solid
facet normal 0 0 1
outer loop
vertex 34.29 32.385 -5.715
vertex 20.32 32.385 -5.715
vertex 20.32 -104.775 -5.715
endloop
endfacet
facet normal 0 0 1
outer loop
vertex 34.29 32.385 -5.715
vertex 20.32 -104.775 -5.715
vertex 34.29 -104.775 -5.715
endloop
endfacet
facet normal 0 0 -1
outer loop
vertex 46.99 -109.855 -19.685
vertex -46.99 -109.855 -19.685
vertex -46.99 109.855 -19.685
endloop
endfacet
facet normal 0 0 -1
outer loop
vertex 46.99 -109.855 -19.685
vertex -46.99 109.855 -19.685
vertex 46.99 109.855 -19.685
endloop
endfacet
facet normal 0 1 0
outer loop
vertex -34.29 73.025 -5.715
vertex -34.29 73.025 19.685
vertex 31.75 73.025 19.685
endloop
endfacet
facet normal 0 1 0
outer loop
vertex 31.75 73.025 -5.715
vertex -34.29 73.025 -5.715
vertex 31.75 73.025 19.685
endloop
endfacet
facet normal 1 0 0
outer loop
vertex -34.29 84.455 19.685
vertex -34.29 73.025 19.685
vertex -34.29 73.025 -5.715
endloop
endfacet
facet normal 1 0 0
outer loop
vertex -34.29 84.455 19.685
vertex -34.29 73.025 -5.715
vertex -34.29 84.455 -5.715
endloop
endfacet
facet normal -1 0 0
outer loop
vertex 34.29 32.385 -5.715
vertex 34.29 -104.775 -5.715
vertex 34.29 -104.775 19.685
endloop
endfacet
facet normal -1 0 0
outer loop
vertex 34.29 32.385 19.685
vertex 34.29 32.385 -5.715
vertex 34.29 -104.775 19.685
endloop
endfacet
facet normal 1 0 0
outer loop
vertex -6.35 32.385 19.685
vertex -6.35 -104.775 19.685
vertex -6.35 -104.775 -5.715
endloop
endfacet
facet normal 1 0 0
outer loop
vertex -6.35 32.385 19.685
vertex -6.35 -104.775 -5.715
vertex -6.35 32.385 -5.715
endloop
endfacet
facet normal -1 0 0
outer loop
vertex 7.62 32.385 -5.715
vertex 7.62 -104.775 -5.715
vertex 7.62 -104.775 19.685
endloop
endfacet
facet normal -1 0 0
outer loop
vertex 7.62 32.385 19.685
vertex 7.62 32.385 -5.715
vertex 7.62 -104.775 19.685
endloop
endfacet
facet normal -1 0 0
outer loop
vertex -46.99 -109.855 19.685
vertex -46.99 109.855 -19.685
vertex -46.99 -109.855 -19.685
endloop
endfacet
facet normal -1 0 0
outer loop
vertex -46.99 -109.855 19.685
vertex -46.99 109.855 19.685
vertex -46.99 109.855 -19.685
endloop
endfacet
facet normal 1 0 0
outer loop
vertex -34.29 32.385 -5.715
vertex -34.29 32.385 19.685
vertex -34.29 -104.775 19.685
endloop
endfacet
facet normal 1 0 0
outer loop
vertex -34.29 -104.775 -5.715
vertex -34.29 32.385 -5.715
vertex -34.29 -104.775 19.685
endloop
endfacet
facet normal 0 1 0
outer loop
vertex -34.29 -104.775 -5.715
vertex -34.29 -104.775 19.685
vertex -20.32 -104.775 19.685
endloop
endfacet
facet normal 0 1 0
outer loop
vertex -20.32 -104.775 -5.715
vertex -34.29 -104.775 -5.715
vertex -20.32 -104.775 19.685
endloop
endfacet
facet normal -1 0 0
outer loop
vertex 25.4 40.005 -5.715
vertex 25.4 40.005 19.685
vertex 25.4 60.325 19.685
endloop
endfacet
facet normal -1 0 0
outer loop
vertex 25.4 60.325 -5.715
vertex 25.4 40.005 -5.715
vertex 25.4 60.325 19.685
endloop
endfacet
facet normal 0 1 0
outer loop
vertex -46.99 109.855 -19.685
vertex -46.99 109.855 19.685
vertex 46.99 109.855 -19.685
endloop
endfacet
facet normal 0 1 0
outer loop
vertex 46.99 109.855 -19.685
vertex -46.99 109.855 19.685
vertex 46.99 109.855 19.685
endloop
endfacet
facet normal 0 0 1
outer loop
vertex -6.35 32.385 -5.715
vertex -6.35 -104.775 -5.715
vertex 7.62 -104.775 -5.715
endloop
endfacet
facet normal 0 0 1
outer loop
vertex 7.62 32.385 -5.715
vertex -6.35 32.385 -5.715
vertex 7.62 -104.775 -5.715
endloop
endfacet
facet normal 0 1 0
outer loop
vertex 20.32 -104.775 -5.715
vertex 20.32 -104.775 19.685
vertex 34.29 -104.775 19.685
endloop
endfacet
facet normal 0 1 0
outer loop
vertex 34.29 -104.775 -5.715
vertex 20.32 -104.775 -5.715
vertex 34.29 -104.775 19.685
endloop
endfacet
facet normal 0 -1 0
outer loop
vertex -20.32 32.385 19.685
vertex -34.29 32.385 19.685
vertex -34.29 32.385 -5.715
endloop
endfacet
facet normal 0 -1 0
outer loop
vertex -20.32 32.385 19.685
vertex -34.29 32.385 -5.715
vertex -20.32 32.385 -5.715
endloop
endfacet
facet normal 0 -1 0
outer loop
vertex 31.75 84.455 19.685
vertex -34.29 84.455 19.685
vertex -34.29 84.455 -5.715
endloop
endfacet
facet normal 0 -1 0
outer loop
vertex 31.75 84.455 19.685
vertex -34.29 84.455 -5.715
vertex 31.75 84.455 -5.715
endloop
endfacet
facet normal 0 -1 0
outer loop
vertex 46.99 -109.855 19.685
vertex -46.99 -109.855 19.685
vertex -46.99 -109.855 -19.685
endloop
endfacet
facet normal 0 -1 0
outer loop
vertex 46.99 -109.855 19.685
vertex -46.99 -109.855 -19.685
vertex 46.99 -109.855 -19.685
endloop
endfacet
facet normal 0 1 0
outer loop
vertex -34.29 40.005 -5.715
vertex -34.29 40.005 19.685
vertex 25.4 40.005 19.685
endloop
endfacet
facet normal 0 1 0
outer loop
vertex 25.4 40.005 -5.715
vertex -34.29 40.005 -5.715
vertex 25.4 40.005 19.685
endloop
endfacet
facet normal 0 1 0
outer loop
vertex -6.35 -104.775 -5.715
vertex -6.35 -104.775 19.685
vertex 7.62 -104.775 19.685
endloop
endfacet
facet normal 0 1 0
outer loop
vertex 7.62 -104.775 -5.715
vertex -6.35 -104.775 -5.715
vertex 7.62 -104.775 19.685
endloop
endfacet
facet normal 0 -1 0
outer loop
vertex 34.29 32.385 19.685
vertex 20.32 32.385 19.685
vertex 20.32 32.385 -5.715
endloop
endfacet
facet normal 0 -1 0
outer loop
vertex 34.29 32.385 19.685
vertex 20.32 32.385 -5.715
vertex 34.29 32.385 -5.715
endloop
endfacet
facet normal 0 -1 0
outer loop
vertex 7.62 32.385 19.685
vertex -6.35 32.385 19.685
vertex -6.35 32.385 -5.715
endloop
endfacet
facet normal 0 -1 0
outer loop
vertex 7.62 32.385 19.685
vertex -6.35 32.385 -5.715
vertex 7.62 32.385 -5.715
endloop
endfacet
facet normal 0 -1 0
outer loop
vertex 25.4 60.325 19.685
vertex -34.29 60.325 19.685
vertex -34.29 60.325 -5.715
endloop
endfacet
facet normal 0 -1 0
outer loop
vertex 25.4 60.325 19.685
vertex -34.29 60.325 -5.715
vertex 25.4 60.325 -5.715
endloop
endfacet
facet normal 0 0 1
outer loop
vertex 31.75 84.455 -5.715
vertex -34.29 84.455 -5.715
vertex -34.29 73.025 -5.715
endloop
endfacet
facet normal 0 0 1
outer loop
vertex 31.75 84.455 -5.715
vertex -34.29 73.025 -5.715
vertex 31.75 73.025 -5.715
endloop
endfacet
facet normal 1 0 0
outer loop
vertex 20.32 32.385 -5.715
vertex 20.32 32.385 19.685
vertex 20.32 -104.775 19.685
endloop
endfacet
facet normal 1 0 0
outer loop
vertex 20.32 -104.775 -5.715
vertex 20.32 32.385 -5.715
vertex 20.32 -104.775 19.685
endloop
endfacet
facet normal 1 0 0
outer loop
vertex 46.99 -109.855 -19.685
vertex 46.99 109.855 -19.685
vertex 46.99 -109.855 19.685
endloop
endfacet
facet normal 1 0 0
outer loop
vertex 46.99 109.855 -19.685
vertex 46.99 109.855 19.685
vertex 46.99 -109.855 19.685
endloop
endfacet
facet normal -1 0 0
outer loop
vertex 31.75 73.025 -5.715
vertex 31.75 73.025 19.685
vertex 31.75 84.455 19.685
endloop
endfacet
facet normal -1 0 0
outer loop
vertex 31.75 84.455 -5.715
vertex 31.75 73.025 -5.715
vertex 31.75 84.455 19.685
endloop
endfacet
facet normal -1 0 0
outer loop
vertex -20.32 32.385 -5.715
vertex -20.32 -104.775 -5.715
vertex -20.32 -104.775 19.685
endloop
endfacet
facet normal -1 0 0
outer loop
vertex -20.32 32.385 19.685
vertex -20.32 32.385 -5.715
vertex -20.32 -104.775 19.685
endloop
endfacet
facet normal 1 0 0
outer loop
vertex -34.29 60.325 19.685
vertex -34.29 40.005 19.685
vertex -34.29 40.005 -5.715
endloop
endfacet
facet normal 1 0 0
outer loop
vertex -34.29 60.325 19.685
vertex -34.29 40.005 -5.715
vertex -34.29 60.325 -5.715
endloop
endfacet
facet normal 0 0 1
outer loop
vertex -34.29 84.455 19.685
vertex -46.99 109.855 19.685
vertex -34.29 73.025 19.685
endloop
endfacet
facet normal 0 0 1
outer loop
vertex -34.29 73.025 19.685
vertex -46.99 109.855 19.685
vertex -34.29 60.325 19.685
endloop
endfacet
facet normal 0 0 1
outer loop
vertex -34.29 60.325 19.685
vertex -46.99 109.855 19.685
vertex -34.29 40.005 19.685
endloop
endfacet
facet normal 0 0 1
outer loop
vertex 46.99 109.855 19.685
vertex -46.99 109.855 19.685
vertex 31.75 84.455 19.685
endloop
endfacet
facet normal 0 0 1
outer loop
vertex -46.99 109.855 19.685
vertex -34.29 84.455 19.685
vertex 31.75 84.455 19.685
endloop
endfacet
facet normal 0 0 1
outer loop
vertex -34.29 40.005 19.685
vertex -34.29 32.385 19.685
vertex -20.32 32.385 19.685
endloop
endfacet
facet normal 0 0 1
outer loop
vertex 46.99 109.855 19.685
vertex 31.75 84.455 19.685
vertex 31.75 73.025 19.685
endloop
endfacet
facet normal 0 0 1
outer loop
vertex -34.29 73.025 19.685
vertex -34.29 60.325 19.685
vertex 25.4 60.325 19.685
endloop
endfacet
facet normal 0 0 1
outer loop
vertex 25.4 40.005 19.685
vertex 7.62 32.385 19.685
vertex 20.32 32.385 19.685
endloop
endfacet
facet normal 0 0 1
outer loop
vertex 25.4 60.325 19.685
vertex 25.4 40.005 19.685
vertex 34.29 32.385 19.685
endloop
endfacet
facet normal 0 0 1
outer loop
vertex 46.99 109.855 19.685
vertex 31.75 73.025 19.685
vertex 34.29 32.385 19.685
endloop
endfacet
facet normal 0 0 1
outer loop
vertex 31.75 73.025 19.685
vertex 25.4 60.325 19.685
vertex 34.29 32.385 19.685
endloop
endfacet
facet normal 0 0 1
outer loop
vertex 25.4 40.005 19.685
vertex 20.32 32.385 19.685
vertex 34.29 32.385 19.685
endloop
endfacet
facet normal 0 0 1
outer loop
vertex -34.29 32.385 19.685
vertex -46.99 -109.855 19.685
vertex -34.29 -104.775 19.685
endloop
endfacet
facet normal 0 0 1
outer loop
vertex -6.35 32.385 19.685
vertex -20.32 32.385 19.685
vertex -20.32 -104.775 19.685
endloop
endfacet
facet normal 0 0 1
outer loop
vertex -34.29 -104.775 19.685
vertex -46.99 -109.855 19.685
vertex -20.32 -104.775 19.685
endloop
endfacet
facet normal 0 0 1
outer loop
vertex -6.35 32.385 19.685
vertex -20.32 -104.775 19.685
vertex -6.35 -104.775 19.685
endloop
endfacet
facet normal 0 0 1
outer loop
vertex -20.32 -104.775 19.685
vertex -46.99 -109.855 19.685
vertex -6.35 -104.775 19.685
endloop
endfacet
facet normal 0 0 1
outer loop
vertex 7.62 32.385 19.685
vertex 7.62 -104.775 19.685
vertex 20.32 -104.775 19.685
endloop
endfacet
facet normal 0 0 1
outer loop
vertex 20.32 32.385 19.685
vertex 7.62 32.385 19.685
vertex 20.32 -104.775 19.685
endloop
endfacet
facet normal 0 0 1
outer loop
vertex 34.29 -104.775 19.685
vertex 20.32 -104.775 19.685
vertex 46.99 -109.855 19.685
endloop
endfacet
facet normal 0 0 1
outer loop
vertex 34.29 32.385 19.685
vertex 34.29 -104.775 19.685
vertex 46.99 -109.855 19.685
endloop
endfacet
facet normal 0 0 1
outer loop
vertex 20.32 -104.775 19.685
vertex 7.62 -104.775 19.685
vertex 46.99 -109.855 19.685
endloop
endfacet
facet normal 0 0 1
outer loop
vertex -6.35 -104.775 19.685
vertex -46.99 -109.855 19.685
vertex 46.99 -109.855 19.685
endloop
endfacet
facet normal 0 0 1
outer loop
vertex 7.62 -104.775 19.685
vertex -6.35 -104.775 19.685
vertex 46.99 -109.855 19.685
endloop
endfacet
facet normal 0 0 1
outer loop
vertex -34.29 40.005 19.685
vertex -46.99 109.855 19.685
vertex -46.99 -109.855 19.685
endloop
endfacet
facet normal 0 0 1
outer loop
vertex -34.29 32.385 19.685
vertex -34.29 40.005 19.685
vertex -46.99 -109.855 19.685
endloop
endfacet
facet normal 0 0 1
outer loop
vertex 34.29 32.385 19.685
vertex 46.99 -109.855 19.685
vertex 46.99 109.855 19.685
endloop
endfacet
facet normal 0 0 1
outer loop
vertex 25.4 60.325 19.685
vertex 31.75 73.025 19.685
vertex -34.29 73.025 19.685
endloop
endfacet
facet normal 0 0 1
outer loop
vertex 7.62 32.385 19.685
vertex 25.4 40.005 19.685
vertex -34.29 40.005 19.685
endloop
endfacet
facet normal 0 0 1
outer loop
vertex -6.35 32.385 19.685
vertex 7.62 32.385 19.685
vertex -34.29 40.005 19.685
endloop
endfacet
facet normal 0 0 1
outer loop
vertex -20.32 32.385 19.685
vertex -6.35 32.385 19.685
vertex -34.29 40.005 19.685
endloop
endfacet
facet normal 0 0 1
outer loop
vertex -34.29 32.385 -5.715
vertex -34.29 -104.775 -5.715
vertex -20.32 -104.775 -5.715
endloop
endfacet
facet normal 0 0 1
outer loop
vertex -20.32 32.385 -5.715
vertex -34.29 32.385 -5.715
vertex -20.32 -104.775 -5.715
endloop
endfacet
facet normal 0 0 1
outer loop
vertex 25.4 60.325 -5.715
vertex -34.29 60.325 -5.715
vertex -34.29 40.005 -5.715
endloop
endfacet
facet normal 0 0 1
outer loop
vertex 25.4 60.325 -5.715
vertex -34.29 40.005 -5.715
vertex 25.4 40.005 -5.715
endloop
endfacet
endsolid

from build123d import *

# Parameters (mm, degrees)
F0_W      = 93.98
F0_H      = 219.71
F1_DEPTH  = 19.685
F1_FACE_W = 93.98
F1_FACE_H = 219.71
F2_DEPTH  = 19.685
F3_W      = 13.97
F3_H      = 137.16
F3_W_2    = 59.69
F3_H_2    = 20.32
F3_W_3    = 66.04
F3_H_3    = 11.43
F4_DEPTH  = 25.4
F5_DEPTH  = 6.35
F6_W      = 13.97
F6_H      = 137.16
F7_DEPTH  = 7.62
F8_DEPTH  = 12.7
F9_W      = 13.97
F9_H      = 25.4
F10_DEPTH = 5.08
F8_FACE_W = 13.97
F8_FACE_H = 25.4
F11_DEPTH = 5.08


with BuildPart() as f1:
    # F0 (on Top) → F1 (new body)
    with BuildSketch(Plane.XY):
        Rectangle(F0_W, F0_H)
    extrude(amount=F1_DEPTH)

    # F1_face (on face) → F2 (join)
    with BuildSketch(Plane(origin=(0, 0, 0), x_dir=(1, 0, 0), z_dir=(0, 0, -1))):
        Rectangle(F1_FACE_W, F1_FACE_H)
    extrude(amount=F2_DEPTH)

    # F3 (on face) → F4 (cut)
    with BuildSketch(Plane.XY.offset(19.685)):
        Polygon((-34.29, -97.155), (-34.29, -109.855), (-20.32, -109.855), (-20.32, 27.305), (-34.29, 27.305), align=None)
        Polygon((20.32, -109.855), (34.29, -109.855), (34.29, -97.155), (34.29, 27.305), (20.32, 27.305), align=None)
        with Locations((0.635, -41.275)):
            Rectangle(F3_W, F3_H)
        with Locations((-4.445, 50.165)):
            Rectangle(F3_W_2, F3_H_2)
        with Locations((-1.27, 78.74)):
            Rectangle(F3_W_3, F3_H_3)
    extrude(amount=-F4_DEPTH, mode=Mode.SUBTRACT)

    # F3 (on face) → F5 (cut)
    with BuildSketch(Plane.XY.offset(19.685)):
        with Locations((-4.445, 50.165)):
            Rectangle(F3_W_2, F3_H_2)
    extrude(amount=-F5_DEPTH, mode=Mode.SUBTRACT)

    # F6 (on face) → F7 (join)
    with BuildSketch(Plane.XY.offset(19.685)):
        with Locations((-27.305, -41.275)):
            Rectangle(F6_W, F6_H)
        with Locations((0.635, -41.275)):
            Rectangle(F6_W, F6_H)
        with Locations((27.305, -41.275)):
            Rectangle(F6_W, F6_H)
    extrude(amount=-F7_DEPTH)

    # F3 (on face) → F8 (cut)
    with BuildSketch(Plane.XY.offset(19.685)):
        Polygon((20.32, -109.855), (34.29, -109.855), (34.29, -97.155), (34.29, 27.305), (20.32, 27.305), align=None)
        with Locations((0.635, -41.275)):
            Rectangle(F3_W, F3_H)
        Polygon((-34.29, -97.155), (-34.29, -109.855), (-20.32, -109.855), (-20.32, 27.305), (-34.29, 27.305), align=None)
    extrude(amount=-F8_DEPTH, mode=Mode.SUBTRACT)

    # F9 (on face) → F10 (join)
    with BuildSketch(Plane.XZ.offset(109.855)):
        with Locations((-27.305, 6.985)):
            Rectangle(F9_W, F9_H)
        with Locations((0.635, 6.985)):
            Rectangle(F9_W, F9_H)
        with Locations((27.305, 6.985)):
            Rectangle(F9_W, F9_H)
    extrude(amount=-F10_DEPTH)

    # F8_face (on face) → F11 (cut)
    with BuildSketch(Plane(origin=(-27.305, 27.305, 6.985), x_dir=(1, 0, 0), z_dir=(0, -1, 0))):
        Rectangle(F8_FACE_W, F8_FACE_H)
        with Locations((27.94, 0)):
            Rectangle(F8_FACE_W, F8_FACE_H)
        with Locations((54.61, 0)):
            Rectangle(F8_FACE_W, F8_FACE_H)
    extrude(amount=-F11_DEPTH, mode=Mode.SUBTRACT)


solid = f1.part
